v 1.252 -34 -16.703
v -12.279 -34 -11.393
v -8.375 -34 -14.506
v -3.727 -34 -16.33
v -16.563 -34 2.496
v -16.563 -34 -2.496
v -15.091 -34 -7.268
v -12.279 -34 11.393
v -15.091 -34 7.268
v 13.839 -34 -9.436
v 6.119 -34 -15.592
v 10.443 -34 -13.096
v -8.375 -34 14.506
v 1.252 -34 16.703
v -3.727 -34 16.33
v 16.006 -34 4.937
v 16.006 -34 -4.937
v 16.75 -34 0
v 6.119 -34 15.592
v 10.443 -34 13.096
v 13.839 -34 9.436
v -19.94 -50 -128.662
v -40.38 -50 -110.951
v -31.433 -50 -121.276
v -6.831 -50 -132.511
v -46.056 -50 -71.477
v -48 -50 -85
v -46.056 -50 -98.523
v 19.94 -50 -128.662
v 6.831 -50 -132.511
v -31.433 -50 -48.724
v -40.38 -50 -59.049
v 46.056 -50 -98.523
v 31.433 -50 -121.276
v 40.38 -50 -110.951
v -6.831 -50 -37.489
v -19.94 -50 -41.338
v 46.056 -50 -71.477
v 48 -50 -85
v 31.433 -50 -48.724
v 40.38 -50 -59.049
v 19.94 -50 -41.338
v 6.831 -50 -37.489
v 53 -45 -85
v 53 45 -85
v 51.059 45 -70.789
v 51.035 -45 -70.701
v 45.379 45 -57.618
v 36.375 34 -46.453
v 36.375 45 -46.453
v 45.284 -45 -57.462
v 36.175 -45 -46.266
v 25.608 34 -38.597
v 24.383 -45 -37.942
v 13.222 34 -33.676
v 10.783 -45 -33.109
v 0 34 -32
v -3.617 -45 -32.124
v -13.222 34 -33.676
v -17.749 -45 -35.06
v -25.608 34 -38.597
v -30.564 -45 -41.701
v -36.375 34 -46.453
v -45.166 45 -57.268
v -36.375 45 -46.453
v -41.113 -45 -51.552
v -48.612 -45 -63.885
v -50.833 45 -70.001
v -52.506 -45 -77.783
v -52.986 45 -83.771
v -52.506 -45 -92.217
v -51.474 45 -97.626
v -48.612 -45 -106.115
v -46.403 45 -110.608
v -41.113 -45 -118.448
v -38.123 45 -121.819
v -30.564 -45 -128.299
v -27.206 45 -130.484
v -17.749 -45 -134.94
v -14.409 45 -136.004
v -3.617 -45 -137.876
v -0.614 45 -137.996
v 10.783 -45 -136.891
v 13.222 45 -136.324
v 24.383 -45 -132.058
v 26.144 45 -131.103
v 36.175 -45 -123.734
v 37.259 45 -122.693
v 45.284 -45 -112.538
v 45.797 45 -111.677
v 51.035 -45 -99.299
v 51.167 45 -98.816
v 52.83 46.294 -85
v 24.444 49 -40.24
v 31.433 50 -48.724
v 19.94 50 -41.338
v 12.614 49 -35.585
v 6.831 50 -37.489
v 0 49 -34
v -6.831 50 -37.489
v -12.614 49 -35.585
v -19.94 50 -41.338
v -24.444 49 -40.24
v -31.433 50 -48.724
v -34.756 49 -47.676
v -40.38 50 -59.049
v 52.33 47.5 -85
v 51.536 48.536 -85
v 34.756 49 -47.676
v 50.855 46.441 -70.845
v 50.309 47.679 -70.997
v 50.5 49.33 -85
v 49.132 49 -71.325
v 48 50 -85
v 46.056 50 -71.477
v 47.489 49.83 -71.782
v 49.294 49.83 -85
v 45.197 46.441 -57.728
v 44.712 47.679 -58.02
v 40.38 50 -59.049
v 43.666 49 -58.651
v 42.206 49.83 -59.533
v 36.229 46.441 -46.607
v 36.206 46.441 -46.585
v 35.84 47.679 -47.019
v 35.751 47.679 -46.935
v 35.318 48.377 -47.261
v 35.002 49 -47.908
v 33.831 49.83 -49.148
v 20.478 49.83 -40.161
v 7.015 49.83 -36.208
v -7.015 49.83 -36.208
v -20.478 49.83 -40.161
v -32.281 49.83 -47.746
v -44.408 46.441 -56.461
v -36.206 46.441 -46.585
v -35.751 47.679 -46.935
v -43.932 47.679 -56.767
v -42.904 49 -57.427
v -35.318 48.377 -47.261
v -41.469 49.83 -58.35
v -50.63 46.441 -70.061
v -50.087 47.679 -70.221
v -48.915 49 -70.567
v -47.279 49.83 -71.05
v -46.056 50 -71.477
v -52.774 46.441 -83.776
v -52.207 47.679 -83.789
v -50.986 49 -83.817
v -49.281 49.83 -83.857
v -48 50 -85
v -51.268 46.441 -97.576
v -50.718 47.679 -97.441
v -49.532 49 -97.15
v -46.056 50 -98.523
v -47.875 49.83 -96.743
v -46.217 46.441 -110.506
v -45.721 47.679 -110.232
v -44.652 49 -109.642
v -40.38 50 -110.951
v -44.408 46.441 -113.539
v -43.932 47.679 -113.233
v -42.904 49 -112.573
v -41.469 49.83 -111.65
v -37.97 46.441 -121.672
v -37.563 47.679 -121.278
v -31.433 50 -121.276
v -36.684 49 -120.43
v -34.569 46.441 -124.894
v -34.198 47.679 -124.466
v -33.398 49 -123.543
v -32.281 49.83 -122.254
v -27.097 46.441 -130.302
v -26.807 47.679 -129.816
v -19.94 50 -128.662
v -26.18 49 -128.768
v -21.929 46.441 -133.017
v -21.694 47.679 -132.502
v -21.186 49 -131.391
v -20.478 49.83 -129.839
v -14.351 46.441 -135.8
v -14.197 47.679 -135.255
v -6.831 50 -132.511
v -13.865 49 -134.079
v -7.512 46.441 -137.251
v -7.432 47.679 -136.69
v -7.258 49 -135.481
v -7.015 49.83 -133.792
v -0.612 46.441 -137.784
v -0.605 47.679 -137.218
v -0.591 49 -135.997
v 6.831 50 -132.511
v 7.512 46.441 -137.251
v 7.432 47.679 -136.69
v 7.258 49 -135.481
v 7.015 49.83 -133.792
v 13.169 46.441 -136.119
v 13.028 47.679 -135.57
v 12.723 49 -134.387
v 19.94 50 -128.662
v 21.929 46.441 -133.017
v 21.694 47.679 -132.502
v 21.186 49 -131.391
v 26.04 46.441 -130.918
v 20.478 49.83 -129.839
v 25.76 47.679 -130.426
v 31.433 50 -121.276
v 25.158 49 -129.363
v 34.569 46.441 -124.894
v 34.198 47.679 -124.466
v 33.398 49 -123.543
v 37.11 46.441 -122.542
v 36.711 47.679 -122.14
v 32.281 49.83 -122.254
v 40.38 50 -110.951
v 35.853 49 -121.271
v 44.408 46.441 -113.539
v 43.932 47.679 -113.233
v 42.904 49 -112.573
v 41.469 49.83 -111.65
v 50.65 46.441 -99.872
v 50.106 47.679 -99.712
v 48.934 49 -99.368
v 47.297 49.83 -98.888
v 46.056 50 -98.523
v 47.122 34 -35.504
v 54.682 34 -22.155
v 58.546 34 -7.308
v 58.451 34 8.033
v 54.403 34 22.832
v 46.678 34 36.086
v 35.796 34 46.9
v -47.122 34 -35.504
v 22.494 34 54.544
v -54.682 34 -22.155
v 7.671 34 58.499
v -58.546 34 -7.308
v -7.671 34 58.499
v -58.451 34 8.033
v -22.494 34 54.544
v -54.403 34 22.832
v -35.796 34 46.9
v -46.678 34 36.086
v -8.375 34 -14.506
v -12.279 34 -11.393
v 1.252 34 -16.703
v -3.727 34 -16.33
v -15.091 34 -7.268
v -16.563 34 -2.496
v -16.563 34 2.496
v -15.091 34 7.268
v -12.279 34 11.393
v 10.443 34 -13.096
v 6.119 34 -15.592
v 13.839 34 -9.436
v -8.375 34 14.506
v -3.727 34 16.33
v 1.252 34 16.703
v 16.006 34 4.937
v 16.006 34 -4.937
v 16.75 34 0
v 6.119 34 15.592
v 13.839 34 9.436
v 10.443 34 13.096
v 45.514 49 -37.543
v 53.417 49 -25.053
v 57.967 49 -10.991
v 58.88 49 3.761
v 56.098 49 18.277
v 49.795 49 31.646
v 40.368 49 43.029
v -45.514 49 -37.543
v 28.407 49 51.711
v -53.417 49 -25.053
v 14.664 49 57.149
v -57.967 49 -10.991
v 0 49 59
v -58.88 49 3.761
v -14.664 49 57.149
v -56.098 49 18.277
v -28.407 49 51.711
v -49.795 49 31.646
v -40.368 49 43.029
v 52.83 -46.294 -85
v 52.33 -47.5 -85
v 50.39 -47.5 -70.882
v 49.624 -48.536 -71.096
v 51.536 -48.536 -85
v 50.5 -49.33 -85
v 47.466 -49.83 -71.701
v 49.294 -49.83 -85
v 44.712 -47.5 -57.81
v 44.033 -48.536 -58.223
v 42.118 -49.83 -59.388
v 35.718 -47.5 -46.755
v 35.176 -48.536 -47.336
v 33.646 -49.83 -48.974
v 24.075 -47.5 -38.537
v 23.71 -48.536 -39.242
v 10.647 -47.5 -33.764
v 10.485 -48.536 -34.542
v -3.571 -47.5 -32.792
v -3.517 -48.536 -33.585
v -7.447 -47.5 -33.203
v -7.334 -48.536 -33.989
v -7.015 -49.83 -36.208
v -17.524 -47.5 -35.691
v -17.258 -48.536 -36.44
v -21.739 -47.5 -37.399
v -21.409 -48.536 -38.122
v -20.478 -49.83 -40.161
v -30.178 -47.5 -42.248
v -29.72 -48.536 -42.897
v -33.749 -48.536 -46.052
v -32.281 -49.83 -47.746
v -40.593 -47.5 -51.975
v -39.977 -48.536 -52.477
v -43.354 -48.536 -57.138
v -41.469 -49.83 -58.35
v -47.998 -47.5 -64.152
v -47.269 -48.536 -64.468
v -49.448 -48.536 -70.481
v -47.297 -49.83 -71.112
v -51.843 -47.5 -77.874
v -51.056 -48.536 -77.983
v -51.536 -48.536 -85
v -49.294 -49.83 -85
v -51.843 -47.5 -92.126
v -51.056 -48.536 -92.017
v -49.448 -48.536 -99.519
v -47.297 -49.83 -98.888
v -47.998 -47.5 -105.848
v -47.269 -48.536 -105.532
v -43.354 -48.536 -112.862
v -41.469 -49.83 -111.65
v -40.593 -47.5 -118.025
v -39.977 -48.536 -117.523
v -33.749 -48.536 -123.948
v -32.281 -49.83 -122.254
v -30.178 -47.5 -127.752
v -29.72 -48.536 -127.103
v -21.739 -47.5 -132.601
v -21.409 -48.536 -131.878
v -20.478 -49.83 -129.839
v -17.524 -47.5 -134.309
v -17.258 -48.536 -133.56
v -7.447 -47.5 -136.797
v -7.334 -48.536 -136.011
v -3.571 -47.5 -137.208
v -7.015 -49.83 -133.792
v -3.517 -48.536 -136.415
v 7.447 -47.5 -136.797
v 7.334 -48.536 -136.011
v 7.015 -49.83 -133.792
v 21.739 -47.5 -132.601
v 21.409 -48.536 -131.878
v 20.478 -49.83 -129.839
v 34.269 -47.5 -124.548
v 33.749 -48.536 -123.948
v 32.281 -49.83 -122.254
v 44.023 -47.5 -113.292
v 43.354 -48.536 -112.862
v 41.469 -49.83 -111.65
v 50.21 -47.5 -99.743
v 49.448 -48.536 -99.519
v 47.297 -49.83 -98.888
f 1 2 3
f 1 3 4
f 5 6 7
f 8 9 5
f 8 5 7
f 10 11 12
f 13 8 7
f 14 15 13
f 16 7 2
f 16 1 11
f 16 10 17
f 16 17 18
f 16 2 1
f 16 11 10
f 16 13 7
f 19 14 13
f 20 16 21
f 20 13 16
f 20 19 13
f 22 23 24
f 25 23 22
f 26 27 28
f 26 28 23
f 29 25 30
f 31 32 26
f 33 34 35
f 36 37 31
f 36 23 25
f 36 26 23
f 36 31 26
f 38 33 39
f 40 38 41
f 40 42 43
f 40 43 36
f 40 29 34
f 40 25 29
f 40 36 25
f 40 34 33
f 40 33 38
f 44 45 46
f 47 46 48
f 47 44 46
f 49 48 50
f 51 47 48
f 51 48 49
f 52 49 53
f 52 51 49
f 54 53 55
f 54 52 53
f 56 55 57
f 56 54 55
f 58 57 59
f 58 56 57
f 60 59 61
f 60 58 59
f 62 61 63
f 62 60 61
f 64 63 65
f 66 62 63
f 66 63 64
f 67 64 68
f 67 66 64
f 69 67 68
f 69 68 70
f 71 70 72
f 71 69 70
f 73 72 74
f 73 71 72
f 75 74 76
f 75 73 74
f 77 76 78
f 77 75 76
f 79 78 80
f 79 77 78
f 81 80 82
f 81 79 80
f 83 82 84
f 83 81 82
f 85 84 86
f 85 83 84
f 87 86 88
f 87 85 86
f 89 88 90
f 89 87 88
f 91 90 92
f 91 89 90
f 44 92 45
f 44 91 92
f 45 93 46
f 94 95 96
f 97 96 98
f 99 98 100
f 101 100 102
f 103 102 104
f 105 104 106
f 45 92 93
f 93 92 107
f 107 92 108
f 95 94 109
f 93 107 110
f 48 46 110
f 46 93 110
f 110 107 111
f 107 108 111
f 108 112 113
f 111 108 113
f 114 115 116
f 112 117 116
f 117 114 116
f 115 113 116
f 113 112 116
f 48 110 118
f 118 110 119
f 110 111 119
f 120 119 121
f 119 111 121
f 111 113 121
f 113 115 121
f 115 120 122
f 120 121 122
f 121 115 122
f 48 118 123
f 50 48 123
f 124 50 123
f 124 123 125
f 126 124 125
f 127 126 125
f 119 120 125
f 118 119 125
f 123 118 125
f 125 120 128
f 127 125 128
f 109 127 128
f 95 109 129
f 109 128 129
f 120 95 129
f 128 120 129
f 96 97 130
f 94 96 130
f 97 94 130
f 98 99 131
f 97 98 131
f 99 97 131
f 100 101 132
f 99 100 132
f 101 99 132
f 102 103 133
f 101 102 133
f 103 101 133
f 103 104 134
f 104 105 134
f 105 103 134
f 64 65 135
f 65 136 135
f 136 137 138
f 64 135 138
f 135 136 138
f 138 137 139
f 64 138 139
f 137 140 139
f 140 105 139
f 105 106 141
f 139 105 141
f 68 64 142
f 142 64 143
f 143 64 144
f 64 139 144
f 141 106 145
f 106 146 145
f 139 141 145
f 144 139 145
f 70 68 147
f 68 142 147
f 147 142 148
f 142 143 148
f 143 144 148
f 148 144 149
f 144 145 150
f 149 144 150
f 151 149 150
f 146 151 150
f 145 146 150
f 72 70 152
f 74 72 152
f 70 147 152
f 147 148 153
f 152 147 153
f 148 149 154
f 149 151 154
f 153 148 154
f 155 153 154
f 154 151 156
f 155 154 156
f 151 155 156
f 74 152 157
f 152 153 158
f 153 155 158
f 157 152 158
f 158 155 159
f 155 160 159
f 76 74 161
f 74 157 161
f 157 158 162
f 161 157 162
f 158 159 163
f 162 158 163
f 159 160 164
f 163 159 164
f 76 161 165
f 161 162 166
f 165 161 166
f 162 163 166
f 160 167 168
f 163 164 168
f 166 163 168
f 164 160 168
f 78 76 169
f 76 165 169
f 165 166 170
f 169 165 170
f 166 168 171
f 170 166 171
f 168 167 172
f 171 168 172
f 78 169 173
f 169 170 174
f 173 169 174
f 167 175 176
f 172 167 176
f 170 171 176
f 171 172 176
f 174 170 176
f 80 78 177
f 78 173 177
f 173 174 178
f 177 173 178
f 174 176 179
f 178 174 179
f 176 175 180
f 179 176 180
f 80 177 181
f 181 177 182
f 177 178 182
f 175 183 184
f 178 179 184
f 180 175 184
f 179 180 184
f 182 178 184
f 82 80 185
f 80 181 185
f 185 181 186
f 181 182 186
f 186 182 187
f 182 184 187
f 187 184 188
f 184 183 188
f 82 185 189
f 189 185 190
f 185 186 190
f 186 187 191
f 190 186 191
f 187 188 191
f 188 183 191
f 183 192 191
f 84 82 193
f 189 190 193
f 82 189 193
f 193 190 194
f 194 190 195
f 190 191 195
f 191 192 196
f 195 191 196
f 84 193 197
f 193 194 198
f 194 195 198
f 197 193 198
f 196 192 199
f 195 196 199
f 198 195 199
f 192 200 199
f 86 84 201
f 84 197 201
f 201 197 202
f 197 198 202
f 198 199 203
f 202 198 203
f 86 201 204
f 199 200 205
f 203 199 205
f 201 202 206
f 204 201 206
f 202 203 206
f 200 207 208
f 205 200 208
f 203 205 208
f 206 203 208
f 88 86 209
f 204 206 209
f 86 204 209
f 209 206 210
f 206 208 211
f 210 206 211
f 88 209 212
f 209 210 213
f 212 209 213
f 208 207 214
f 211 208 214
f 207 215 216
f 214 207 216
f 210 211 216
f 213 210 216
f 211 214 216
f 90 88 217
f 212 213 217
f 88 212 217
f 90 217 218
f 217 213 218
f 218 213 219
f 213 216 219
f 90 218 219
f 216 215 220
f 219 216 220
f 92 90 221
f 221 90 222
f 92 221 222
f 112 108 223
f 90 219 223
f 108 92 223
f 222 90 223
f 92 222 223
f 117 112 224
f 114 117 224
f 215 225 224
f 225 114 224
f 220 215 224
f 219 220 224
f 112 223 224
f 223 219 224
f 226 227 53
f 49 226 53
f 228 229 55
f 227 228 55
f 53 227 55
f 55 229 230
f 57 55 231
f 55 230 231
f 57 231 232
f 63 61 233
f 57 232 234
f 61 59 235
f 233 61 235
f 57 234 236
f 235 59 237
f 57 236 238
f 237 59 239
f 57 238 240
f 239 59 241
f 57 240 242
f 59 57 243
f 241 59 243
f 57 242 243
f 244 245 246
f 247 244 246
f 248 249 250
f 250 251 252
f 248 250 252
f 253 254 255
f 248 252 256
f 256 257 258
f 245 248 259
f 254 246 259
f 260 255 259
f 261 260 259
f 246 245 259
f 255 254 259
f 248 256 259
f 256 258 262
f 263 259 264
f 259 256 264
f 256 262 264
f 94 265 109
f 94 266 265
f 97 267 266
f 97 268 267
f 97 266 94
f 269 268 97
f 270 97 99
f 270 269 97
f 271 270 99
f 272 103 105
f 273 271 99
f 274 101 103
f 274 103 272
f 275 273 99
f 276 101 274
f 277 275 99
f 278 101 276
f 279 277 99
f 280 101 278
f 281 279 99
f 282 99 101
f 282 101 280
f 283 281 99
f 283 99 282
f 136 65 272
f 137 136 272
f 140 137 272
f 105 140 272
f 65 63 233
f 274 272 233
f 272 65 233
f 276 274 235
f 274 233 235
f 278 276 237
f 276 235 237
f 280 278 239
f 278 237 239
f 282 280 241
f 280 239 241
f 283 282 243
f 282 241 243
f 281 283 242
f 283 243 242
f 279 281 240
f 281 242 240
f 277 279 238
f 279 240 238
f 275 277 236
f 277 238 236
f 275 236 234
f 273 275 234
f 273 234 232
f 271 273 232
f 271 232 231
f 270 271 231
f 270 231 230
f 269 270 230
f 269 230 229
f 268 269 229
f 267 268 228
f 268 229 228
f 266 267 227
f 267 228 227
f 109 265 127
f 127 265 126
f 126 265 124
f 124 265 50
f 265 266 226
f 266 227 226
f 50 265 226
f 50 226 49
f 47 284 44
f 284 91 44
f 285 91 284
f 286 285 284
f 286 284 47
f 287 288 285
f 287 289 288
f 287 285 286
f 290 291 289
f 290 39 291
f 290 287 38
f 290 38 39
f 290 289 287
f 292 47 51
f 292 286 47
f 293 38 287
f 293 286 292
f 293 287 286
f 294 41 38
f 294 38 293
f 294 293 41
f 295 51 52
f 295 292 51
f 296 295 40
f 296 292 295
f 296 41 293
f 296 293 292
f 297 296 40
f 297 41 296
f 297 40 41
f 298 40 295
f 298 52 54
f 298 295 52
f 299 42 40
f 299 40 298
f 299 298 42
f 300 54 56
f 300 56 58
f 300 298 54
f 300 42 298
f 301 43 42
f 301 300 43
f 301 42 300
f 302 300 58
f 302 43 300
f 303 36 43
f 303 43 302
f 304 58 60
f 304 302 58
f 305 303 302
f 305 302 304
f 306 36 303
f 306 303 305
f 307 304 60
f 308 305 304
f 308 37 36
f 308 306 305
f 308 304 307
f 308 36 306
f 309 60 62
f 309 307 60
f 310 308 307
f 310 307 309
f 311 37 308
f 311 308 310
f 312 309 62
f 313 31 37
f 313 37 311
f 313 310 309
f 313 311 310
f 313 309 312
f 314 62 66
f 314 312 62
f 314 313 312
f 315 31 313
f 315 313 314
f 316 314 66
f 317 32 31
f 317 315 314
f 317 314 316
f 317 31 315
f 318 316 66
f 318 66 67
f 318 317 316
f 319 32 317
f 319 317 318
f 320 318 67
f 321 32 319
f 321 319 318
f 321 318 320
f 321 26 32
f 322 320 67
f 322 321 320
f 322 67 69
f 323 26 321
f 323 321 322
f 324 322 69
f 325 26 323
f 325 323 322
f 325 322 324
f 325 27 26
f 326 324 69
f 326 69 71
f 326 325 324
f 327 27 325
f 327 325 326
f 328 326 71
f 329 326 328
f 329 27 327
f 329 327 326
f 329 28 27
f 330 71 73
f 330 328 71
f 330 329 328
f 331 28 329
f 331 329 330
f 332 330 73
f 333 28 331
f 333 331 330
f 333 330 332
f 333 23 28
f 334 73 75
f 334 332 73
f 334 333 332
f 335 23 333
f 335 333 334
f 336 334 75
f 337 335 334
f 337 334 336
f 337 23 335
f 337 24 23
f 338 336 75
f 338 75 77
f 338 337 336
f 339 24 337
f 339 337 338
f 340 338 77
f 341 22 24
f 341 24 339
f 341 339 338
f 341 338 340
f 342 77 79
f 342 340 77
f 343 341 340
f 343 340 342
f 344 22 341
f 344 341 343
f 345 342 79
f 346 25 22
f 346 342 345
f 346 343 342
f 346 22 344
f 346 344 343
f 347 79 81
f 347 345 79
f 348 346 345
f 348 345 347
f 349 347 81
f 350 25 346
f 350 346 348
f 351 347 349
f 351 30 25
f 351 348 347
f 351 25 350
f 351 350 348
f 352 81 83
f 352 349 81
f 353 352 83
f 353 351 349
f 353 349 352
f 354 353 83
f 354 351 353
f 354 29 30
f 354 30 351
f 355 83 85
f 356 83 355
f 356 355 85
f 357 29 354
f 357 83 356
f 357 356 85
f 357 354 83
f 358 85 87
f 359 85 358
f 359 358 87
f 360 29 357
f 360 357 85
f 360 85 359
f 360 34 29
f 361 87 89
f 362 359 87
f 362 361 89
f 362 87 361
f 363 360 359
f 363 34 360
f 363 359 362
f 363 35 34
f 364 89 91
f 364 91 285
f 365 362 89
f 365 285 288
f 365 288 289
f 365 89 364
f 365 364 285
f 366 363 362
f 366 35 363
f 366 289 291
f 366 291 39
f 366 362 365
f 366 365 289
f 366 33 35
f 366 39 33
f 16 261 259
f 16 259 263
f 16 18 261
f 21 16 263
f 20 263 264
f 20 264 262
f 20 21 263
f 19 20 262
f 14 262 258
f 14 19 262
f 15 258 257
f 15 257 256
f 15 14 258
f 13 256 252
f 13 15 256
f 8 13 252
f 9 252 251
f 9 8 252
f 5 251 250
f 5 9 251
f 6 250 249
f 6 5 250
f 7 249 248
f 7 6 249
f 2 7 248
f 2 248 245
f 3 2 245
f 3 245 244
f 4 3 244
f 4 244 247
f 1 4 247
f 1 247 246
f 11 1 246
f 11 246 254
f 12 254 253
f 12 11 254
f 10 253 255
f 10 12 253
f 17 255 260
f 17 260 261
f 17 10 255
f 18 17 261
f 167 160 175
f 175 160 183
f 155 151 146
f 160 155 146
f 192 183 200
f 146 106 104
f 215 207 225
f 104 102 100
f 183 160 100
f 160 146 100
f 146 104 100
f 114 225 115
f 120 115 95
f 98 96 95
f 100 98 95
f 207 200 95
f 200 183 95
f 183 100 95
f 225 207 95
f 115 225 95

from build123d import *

# Parameters (mm, degrees)
F1_R     = 53
F2_DEPTH = 50
F3_R     = 5
F4_R     = 16.75
F5_DEPTH = 34
F6_R     = 59
F7_DEPTH = 15


with BuildPart() as f2:
    # F1 (on Front) → F2 (new body, symmetric)
    with BuildSketch(Plane.XZ):
        with Locations((0, -85)):
            Circle(F1_R)
    extrude(amount=F2_DEPTH, both=True)

    # F3
    f3_edges = [f2.edges().sort_by_distance(p)[0] for p in [
        (-53, -50, -85),
        (-53, 50, -85),
    ]]
    fillet(f3_edges, radius=F3_R)

    # F6 (on face) → F7 (join)
    with BuildSketch(Plane(origin=(0, 34, 0), x_dir=(-1, 0, 0), z_dir=(0, 1, 0))):
        Circle(F6_R)
    extrude(amount=F7_DEPTH)


with BuildPart() as f5:
    # F4 (on Front) → F5 (new body, symmetric)
    with BuildSketch(Plane.XZ):
        Circle(F4_R)
    extrude(amount=F5_DEPTH, both=True)


solid = Compound([f2.part, f5.part])
